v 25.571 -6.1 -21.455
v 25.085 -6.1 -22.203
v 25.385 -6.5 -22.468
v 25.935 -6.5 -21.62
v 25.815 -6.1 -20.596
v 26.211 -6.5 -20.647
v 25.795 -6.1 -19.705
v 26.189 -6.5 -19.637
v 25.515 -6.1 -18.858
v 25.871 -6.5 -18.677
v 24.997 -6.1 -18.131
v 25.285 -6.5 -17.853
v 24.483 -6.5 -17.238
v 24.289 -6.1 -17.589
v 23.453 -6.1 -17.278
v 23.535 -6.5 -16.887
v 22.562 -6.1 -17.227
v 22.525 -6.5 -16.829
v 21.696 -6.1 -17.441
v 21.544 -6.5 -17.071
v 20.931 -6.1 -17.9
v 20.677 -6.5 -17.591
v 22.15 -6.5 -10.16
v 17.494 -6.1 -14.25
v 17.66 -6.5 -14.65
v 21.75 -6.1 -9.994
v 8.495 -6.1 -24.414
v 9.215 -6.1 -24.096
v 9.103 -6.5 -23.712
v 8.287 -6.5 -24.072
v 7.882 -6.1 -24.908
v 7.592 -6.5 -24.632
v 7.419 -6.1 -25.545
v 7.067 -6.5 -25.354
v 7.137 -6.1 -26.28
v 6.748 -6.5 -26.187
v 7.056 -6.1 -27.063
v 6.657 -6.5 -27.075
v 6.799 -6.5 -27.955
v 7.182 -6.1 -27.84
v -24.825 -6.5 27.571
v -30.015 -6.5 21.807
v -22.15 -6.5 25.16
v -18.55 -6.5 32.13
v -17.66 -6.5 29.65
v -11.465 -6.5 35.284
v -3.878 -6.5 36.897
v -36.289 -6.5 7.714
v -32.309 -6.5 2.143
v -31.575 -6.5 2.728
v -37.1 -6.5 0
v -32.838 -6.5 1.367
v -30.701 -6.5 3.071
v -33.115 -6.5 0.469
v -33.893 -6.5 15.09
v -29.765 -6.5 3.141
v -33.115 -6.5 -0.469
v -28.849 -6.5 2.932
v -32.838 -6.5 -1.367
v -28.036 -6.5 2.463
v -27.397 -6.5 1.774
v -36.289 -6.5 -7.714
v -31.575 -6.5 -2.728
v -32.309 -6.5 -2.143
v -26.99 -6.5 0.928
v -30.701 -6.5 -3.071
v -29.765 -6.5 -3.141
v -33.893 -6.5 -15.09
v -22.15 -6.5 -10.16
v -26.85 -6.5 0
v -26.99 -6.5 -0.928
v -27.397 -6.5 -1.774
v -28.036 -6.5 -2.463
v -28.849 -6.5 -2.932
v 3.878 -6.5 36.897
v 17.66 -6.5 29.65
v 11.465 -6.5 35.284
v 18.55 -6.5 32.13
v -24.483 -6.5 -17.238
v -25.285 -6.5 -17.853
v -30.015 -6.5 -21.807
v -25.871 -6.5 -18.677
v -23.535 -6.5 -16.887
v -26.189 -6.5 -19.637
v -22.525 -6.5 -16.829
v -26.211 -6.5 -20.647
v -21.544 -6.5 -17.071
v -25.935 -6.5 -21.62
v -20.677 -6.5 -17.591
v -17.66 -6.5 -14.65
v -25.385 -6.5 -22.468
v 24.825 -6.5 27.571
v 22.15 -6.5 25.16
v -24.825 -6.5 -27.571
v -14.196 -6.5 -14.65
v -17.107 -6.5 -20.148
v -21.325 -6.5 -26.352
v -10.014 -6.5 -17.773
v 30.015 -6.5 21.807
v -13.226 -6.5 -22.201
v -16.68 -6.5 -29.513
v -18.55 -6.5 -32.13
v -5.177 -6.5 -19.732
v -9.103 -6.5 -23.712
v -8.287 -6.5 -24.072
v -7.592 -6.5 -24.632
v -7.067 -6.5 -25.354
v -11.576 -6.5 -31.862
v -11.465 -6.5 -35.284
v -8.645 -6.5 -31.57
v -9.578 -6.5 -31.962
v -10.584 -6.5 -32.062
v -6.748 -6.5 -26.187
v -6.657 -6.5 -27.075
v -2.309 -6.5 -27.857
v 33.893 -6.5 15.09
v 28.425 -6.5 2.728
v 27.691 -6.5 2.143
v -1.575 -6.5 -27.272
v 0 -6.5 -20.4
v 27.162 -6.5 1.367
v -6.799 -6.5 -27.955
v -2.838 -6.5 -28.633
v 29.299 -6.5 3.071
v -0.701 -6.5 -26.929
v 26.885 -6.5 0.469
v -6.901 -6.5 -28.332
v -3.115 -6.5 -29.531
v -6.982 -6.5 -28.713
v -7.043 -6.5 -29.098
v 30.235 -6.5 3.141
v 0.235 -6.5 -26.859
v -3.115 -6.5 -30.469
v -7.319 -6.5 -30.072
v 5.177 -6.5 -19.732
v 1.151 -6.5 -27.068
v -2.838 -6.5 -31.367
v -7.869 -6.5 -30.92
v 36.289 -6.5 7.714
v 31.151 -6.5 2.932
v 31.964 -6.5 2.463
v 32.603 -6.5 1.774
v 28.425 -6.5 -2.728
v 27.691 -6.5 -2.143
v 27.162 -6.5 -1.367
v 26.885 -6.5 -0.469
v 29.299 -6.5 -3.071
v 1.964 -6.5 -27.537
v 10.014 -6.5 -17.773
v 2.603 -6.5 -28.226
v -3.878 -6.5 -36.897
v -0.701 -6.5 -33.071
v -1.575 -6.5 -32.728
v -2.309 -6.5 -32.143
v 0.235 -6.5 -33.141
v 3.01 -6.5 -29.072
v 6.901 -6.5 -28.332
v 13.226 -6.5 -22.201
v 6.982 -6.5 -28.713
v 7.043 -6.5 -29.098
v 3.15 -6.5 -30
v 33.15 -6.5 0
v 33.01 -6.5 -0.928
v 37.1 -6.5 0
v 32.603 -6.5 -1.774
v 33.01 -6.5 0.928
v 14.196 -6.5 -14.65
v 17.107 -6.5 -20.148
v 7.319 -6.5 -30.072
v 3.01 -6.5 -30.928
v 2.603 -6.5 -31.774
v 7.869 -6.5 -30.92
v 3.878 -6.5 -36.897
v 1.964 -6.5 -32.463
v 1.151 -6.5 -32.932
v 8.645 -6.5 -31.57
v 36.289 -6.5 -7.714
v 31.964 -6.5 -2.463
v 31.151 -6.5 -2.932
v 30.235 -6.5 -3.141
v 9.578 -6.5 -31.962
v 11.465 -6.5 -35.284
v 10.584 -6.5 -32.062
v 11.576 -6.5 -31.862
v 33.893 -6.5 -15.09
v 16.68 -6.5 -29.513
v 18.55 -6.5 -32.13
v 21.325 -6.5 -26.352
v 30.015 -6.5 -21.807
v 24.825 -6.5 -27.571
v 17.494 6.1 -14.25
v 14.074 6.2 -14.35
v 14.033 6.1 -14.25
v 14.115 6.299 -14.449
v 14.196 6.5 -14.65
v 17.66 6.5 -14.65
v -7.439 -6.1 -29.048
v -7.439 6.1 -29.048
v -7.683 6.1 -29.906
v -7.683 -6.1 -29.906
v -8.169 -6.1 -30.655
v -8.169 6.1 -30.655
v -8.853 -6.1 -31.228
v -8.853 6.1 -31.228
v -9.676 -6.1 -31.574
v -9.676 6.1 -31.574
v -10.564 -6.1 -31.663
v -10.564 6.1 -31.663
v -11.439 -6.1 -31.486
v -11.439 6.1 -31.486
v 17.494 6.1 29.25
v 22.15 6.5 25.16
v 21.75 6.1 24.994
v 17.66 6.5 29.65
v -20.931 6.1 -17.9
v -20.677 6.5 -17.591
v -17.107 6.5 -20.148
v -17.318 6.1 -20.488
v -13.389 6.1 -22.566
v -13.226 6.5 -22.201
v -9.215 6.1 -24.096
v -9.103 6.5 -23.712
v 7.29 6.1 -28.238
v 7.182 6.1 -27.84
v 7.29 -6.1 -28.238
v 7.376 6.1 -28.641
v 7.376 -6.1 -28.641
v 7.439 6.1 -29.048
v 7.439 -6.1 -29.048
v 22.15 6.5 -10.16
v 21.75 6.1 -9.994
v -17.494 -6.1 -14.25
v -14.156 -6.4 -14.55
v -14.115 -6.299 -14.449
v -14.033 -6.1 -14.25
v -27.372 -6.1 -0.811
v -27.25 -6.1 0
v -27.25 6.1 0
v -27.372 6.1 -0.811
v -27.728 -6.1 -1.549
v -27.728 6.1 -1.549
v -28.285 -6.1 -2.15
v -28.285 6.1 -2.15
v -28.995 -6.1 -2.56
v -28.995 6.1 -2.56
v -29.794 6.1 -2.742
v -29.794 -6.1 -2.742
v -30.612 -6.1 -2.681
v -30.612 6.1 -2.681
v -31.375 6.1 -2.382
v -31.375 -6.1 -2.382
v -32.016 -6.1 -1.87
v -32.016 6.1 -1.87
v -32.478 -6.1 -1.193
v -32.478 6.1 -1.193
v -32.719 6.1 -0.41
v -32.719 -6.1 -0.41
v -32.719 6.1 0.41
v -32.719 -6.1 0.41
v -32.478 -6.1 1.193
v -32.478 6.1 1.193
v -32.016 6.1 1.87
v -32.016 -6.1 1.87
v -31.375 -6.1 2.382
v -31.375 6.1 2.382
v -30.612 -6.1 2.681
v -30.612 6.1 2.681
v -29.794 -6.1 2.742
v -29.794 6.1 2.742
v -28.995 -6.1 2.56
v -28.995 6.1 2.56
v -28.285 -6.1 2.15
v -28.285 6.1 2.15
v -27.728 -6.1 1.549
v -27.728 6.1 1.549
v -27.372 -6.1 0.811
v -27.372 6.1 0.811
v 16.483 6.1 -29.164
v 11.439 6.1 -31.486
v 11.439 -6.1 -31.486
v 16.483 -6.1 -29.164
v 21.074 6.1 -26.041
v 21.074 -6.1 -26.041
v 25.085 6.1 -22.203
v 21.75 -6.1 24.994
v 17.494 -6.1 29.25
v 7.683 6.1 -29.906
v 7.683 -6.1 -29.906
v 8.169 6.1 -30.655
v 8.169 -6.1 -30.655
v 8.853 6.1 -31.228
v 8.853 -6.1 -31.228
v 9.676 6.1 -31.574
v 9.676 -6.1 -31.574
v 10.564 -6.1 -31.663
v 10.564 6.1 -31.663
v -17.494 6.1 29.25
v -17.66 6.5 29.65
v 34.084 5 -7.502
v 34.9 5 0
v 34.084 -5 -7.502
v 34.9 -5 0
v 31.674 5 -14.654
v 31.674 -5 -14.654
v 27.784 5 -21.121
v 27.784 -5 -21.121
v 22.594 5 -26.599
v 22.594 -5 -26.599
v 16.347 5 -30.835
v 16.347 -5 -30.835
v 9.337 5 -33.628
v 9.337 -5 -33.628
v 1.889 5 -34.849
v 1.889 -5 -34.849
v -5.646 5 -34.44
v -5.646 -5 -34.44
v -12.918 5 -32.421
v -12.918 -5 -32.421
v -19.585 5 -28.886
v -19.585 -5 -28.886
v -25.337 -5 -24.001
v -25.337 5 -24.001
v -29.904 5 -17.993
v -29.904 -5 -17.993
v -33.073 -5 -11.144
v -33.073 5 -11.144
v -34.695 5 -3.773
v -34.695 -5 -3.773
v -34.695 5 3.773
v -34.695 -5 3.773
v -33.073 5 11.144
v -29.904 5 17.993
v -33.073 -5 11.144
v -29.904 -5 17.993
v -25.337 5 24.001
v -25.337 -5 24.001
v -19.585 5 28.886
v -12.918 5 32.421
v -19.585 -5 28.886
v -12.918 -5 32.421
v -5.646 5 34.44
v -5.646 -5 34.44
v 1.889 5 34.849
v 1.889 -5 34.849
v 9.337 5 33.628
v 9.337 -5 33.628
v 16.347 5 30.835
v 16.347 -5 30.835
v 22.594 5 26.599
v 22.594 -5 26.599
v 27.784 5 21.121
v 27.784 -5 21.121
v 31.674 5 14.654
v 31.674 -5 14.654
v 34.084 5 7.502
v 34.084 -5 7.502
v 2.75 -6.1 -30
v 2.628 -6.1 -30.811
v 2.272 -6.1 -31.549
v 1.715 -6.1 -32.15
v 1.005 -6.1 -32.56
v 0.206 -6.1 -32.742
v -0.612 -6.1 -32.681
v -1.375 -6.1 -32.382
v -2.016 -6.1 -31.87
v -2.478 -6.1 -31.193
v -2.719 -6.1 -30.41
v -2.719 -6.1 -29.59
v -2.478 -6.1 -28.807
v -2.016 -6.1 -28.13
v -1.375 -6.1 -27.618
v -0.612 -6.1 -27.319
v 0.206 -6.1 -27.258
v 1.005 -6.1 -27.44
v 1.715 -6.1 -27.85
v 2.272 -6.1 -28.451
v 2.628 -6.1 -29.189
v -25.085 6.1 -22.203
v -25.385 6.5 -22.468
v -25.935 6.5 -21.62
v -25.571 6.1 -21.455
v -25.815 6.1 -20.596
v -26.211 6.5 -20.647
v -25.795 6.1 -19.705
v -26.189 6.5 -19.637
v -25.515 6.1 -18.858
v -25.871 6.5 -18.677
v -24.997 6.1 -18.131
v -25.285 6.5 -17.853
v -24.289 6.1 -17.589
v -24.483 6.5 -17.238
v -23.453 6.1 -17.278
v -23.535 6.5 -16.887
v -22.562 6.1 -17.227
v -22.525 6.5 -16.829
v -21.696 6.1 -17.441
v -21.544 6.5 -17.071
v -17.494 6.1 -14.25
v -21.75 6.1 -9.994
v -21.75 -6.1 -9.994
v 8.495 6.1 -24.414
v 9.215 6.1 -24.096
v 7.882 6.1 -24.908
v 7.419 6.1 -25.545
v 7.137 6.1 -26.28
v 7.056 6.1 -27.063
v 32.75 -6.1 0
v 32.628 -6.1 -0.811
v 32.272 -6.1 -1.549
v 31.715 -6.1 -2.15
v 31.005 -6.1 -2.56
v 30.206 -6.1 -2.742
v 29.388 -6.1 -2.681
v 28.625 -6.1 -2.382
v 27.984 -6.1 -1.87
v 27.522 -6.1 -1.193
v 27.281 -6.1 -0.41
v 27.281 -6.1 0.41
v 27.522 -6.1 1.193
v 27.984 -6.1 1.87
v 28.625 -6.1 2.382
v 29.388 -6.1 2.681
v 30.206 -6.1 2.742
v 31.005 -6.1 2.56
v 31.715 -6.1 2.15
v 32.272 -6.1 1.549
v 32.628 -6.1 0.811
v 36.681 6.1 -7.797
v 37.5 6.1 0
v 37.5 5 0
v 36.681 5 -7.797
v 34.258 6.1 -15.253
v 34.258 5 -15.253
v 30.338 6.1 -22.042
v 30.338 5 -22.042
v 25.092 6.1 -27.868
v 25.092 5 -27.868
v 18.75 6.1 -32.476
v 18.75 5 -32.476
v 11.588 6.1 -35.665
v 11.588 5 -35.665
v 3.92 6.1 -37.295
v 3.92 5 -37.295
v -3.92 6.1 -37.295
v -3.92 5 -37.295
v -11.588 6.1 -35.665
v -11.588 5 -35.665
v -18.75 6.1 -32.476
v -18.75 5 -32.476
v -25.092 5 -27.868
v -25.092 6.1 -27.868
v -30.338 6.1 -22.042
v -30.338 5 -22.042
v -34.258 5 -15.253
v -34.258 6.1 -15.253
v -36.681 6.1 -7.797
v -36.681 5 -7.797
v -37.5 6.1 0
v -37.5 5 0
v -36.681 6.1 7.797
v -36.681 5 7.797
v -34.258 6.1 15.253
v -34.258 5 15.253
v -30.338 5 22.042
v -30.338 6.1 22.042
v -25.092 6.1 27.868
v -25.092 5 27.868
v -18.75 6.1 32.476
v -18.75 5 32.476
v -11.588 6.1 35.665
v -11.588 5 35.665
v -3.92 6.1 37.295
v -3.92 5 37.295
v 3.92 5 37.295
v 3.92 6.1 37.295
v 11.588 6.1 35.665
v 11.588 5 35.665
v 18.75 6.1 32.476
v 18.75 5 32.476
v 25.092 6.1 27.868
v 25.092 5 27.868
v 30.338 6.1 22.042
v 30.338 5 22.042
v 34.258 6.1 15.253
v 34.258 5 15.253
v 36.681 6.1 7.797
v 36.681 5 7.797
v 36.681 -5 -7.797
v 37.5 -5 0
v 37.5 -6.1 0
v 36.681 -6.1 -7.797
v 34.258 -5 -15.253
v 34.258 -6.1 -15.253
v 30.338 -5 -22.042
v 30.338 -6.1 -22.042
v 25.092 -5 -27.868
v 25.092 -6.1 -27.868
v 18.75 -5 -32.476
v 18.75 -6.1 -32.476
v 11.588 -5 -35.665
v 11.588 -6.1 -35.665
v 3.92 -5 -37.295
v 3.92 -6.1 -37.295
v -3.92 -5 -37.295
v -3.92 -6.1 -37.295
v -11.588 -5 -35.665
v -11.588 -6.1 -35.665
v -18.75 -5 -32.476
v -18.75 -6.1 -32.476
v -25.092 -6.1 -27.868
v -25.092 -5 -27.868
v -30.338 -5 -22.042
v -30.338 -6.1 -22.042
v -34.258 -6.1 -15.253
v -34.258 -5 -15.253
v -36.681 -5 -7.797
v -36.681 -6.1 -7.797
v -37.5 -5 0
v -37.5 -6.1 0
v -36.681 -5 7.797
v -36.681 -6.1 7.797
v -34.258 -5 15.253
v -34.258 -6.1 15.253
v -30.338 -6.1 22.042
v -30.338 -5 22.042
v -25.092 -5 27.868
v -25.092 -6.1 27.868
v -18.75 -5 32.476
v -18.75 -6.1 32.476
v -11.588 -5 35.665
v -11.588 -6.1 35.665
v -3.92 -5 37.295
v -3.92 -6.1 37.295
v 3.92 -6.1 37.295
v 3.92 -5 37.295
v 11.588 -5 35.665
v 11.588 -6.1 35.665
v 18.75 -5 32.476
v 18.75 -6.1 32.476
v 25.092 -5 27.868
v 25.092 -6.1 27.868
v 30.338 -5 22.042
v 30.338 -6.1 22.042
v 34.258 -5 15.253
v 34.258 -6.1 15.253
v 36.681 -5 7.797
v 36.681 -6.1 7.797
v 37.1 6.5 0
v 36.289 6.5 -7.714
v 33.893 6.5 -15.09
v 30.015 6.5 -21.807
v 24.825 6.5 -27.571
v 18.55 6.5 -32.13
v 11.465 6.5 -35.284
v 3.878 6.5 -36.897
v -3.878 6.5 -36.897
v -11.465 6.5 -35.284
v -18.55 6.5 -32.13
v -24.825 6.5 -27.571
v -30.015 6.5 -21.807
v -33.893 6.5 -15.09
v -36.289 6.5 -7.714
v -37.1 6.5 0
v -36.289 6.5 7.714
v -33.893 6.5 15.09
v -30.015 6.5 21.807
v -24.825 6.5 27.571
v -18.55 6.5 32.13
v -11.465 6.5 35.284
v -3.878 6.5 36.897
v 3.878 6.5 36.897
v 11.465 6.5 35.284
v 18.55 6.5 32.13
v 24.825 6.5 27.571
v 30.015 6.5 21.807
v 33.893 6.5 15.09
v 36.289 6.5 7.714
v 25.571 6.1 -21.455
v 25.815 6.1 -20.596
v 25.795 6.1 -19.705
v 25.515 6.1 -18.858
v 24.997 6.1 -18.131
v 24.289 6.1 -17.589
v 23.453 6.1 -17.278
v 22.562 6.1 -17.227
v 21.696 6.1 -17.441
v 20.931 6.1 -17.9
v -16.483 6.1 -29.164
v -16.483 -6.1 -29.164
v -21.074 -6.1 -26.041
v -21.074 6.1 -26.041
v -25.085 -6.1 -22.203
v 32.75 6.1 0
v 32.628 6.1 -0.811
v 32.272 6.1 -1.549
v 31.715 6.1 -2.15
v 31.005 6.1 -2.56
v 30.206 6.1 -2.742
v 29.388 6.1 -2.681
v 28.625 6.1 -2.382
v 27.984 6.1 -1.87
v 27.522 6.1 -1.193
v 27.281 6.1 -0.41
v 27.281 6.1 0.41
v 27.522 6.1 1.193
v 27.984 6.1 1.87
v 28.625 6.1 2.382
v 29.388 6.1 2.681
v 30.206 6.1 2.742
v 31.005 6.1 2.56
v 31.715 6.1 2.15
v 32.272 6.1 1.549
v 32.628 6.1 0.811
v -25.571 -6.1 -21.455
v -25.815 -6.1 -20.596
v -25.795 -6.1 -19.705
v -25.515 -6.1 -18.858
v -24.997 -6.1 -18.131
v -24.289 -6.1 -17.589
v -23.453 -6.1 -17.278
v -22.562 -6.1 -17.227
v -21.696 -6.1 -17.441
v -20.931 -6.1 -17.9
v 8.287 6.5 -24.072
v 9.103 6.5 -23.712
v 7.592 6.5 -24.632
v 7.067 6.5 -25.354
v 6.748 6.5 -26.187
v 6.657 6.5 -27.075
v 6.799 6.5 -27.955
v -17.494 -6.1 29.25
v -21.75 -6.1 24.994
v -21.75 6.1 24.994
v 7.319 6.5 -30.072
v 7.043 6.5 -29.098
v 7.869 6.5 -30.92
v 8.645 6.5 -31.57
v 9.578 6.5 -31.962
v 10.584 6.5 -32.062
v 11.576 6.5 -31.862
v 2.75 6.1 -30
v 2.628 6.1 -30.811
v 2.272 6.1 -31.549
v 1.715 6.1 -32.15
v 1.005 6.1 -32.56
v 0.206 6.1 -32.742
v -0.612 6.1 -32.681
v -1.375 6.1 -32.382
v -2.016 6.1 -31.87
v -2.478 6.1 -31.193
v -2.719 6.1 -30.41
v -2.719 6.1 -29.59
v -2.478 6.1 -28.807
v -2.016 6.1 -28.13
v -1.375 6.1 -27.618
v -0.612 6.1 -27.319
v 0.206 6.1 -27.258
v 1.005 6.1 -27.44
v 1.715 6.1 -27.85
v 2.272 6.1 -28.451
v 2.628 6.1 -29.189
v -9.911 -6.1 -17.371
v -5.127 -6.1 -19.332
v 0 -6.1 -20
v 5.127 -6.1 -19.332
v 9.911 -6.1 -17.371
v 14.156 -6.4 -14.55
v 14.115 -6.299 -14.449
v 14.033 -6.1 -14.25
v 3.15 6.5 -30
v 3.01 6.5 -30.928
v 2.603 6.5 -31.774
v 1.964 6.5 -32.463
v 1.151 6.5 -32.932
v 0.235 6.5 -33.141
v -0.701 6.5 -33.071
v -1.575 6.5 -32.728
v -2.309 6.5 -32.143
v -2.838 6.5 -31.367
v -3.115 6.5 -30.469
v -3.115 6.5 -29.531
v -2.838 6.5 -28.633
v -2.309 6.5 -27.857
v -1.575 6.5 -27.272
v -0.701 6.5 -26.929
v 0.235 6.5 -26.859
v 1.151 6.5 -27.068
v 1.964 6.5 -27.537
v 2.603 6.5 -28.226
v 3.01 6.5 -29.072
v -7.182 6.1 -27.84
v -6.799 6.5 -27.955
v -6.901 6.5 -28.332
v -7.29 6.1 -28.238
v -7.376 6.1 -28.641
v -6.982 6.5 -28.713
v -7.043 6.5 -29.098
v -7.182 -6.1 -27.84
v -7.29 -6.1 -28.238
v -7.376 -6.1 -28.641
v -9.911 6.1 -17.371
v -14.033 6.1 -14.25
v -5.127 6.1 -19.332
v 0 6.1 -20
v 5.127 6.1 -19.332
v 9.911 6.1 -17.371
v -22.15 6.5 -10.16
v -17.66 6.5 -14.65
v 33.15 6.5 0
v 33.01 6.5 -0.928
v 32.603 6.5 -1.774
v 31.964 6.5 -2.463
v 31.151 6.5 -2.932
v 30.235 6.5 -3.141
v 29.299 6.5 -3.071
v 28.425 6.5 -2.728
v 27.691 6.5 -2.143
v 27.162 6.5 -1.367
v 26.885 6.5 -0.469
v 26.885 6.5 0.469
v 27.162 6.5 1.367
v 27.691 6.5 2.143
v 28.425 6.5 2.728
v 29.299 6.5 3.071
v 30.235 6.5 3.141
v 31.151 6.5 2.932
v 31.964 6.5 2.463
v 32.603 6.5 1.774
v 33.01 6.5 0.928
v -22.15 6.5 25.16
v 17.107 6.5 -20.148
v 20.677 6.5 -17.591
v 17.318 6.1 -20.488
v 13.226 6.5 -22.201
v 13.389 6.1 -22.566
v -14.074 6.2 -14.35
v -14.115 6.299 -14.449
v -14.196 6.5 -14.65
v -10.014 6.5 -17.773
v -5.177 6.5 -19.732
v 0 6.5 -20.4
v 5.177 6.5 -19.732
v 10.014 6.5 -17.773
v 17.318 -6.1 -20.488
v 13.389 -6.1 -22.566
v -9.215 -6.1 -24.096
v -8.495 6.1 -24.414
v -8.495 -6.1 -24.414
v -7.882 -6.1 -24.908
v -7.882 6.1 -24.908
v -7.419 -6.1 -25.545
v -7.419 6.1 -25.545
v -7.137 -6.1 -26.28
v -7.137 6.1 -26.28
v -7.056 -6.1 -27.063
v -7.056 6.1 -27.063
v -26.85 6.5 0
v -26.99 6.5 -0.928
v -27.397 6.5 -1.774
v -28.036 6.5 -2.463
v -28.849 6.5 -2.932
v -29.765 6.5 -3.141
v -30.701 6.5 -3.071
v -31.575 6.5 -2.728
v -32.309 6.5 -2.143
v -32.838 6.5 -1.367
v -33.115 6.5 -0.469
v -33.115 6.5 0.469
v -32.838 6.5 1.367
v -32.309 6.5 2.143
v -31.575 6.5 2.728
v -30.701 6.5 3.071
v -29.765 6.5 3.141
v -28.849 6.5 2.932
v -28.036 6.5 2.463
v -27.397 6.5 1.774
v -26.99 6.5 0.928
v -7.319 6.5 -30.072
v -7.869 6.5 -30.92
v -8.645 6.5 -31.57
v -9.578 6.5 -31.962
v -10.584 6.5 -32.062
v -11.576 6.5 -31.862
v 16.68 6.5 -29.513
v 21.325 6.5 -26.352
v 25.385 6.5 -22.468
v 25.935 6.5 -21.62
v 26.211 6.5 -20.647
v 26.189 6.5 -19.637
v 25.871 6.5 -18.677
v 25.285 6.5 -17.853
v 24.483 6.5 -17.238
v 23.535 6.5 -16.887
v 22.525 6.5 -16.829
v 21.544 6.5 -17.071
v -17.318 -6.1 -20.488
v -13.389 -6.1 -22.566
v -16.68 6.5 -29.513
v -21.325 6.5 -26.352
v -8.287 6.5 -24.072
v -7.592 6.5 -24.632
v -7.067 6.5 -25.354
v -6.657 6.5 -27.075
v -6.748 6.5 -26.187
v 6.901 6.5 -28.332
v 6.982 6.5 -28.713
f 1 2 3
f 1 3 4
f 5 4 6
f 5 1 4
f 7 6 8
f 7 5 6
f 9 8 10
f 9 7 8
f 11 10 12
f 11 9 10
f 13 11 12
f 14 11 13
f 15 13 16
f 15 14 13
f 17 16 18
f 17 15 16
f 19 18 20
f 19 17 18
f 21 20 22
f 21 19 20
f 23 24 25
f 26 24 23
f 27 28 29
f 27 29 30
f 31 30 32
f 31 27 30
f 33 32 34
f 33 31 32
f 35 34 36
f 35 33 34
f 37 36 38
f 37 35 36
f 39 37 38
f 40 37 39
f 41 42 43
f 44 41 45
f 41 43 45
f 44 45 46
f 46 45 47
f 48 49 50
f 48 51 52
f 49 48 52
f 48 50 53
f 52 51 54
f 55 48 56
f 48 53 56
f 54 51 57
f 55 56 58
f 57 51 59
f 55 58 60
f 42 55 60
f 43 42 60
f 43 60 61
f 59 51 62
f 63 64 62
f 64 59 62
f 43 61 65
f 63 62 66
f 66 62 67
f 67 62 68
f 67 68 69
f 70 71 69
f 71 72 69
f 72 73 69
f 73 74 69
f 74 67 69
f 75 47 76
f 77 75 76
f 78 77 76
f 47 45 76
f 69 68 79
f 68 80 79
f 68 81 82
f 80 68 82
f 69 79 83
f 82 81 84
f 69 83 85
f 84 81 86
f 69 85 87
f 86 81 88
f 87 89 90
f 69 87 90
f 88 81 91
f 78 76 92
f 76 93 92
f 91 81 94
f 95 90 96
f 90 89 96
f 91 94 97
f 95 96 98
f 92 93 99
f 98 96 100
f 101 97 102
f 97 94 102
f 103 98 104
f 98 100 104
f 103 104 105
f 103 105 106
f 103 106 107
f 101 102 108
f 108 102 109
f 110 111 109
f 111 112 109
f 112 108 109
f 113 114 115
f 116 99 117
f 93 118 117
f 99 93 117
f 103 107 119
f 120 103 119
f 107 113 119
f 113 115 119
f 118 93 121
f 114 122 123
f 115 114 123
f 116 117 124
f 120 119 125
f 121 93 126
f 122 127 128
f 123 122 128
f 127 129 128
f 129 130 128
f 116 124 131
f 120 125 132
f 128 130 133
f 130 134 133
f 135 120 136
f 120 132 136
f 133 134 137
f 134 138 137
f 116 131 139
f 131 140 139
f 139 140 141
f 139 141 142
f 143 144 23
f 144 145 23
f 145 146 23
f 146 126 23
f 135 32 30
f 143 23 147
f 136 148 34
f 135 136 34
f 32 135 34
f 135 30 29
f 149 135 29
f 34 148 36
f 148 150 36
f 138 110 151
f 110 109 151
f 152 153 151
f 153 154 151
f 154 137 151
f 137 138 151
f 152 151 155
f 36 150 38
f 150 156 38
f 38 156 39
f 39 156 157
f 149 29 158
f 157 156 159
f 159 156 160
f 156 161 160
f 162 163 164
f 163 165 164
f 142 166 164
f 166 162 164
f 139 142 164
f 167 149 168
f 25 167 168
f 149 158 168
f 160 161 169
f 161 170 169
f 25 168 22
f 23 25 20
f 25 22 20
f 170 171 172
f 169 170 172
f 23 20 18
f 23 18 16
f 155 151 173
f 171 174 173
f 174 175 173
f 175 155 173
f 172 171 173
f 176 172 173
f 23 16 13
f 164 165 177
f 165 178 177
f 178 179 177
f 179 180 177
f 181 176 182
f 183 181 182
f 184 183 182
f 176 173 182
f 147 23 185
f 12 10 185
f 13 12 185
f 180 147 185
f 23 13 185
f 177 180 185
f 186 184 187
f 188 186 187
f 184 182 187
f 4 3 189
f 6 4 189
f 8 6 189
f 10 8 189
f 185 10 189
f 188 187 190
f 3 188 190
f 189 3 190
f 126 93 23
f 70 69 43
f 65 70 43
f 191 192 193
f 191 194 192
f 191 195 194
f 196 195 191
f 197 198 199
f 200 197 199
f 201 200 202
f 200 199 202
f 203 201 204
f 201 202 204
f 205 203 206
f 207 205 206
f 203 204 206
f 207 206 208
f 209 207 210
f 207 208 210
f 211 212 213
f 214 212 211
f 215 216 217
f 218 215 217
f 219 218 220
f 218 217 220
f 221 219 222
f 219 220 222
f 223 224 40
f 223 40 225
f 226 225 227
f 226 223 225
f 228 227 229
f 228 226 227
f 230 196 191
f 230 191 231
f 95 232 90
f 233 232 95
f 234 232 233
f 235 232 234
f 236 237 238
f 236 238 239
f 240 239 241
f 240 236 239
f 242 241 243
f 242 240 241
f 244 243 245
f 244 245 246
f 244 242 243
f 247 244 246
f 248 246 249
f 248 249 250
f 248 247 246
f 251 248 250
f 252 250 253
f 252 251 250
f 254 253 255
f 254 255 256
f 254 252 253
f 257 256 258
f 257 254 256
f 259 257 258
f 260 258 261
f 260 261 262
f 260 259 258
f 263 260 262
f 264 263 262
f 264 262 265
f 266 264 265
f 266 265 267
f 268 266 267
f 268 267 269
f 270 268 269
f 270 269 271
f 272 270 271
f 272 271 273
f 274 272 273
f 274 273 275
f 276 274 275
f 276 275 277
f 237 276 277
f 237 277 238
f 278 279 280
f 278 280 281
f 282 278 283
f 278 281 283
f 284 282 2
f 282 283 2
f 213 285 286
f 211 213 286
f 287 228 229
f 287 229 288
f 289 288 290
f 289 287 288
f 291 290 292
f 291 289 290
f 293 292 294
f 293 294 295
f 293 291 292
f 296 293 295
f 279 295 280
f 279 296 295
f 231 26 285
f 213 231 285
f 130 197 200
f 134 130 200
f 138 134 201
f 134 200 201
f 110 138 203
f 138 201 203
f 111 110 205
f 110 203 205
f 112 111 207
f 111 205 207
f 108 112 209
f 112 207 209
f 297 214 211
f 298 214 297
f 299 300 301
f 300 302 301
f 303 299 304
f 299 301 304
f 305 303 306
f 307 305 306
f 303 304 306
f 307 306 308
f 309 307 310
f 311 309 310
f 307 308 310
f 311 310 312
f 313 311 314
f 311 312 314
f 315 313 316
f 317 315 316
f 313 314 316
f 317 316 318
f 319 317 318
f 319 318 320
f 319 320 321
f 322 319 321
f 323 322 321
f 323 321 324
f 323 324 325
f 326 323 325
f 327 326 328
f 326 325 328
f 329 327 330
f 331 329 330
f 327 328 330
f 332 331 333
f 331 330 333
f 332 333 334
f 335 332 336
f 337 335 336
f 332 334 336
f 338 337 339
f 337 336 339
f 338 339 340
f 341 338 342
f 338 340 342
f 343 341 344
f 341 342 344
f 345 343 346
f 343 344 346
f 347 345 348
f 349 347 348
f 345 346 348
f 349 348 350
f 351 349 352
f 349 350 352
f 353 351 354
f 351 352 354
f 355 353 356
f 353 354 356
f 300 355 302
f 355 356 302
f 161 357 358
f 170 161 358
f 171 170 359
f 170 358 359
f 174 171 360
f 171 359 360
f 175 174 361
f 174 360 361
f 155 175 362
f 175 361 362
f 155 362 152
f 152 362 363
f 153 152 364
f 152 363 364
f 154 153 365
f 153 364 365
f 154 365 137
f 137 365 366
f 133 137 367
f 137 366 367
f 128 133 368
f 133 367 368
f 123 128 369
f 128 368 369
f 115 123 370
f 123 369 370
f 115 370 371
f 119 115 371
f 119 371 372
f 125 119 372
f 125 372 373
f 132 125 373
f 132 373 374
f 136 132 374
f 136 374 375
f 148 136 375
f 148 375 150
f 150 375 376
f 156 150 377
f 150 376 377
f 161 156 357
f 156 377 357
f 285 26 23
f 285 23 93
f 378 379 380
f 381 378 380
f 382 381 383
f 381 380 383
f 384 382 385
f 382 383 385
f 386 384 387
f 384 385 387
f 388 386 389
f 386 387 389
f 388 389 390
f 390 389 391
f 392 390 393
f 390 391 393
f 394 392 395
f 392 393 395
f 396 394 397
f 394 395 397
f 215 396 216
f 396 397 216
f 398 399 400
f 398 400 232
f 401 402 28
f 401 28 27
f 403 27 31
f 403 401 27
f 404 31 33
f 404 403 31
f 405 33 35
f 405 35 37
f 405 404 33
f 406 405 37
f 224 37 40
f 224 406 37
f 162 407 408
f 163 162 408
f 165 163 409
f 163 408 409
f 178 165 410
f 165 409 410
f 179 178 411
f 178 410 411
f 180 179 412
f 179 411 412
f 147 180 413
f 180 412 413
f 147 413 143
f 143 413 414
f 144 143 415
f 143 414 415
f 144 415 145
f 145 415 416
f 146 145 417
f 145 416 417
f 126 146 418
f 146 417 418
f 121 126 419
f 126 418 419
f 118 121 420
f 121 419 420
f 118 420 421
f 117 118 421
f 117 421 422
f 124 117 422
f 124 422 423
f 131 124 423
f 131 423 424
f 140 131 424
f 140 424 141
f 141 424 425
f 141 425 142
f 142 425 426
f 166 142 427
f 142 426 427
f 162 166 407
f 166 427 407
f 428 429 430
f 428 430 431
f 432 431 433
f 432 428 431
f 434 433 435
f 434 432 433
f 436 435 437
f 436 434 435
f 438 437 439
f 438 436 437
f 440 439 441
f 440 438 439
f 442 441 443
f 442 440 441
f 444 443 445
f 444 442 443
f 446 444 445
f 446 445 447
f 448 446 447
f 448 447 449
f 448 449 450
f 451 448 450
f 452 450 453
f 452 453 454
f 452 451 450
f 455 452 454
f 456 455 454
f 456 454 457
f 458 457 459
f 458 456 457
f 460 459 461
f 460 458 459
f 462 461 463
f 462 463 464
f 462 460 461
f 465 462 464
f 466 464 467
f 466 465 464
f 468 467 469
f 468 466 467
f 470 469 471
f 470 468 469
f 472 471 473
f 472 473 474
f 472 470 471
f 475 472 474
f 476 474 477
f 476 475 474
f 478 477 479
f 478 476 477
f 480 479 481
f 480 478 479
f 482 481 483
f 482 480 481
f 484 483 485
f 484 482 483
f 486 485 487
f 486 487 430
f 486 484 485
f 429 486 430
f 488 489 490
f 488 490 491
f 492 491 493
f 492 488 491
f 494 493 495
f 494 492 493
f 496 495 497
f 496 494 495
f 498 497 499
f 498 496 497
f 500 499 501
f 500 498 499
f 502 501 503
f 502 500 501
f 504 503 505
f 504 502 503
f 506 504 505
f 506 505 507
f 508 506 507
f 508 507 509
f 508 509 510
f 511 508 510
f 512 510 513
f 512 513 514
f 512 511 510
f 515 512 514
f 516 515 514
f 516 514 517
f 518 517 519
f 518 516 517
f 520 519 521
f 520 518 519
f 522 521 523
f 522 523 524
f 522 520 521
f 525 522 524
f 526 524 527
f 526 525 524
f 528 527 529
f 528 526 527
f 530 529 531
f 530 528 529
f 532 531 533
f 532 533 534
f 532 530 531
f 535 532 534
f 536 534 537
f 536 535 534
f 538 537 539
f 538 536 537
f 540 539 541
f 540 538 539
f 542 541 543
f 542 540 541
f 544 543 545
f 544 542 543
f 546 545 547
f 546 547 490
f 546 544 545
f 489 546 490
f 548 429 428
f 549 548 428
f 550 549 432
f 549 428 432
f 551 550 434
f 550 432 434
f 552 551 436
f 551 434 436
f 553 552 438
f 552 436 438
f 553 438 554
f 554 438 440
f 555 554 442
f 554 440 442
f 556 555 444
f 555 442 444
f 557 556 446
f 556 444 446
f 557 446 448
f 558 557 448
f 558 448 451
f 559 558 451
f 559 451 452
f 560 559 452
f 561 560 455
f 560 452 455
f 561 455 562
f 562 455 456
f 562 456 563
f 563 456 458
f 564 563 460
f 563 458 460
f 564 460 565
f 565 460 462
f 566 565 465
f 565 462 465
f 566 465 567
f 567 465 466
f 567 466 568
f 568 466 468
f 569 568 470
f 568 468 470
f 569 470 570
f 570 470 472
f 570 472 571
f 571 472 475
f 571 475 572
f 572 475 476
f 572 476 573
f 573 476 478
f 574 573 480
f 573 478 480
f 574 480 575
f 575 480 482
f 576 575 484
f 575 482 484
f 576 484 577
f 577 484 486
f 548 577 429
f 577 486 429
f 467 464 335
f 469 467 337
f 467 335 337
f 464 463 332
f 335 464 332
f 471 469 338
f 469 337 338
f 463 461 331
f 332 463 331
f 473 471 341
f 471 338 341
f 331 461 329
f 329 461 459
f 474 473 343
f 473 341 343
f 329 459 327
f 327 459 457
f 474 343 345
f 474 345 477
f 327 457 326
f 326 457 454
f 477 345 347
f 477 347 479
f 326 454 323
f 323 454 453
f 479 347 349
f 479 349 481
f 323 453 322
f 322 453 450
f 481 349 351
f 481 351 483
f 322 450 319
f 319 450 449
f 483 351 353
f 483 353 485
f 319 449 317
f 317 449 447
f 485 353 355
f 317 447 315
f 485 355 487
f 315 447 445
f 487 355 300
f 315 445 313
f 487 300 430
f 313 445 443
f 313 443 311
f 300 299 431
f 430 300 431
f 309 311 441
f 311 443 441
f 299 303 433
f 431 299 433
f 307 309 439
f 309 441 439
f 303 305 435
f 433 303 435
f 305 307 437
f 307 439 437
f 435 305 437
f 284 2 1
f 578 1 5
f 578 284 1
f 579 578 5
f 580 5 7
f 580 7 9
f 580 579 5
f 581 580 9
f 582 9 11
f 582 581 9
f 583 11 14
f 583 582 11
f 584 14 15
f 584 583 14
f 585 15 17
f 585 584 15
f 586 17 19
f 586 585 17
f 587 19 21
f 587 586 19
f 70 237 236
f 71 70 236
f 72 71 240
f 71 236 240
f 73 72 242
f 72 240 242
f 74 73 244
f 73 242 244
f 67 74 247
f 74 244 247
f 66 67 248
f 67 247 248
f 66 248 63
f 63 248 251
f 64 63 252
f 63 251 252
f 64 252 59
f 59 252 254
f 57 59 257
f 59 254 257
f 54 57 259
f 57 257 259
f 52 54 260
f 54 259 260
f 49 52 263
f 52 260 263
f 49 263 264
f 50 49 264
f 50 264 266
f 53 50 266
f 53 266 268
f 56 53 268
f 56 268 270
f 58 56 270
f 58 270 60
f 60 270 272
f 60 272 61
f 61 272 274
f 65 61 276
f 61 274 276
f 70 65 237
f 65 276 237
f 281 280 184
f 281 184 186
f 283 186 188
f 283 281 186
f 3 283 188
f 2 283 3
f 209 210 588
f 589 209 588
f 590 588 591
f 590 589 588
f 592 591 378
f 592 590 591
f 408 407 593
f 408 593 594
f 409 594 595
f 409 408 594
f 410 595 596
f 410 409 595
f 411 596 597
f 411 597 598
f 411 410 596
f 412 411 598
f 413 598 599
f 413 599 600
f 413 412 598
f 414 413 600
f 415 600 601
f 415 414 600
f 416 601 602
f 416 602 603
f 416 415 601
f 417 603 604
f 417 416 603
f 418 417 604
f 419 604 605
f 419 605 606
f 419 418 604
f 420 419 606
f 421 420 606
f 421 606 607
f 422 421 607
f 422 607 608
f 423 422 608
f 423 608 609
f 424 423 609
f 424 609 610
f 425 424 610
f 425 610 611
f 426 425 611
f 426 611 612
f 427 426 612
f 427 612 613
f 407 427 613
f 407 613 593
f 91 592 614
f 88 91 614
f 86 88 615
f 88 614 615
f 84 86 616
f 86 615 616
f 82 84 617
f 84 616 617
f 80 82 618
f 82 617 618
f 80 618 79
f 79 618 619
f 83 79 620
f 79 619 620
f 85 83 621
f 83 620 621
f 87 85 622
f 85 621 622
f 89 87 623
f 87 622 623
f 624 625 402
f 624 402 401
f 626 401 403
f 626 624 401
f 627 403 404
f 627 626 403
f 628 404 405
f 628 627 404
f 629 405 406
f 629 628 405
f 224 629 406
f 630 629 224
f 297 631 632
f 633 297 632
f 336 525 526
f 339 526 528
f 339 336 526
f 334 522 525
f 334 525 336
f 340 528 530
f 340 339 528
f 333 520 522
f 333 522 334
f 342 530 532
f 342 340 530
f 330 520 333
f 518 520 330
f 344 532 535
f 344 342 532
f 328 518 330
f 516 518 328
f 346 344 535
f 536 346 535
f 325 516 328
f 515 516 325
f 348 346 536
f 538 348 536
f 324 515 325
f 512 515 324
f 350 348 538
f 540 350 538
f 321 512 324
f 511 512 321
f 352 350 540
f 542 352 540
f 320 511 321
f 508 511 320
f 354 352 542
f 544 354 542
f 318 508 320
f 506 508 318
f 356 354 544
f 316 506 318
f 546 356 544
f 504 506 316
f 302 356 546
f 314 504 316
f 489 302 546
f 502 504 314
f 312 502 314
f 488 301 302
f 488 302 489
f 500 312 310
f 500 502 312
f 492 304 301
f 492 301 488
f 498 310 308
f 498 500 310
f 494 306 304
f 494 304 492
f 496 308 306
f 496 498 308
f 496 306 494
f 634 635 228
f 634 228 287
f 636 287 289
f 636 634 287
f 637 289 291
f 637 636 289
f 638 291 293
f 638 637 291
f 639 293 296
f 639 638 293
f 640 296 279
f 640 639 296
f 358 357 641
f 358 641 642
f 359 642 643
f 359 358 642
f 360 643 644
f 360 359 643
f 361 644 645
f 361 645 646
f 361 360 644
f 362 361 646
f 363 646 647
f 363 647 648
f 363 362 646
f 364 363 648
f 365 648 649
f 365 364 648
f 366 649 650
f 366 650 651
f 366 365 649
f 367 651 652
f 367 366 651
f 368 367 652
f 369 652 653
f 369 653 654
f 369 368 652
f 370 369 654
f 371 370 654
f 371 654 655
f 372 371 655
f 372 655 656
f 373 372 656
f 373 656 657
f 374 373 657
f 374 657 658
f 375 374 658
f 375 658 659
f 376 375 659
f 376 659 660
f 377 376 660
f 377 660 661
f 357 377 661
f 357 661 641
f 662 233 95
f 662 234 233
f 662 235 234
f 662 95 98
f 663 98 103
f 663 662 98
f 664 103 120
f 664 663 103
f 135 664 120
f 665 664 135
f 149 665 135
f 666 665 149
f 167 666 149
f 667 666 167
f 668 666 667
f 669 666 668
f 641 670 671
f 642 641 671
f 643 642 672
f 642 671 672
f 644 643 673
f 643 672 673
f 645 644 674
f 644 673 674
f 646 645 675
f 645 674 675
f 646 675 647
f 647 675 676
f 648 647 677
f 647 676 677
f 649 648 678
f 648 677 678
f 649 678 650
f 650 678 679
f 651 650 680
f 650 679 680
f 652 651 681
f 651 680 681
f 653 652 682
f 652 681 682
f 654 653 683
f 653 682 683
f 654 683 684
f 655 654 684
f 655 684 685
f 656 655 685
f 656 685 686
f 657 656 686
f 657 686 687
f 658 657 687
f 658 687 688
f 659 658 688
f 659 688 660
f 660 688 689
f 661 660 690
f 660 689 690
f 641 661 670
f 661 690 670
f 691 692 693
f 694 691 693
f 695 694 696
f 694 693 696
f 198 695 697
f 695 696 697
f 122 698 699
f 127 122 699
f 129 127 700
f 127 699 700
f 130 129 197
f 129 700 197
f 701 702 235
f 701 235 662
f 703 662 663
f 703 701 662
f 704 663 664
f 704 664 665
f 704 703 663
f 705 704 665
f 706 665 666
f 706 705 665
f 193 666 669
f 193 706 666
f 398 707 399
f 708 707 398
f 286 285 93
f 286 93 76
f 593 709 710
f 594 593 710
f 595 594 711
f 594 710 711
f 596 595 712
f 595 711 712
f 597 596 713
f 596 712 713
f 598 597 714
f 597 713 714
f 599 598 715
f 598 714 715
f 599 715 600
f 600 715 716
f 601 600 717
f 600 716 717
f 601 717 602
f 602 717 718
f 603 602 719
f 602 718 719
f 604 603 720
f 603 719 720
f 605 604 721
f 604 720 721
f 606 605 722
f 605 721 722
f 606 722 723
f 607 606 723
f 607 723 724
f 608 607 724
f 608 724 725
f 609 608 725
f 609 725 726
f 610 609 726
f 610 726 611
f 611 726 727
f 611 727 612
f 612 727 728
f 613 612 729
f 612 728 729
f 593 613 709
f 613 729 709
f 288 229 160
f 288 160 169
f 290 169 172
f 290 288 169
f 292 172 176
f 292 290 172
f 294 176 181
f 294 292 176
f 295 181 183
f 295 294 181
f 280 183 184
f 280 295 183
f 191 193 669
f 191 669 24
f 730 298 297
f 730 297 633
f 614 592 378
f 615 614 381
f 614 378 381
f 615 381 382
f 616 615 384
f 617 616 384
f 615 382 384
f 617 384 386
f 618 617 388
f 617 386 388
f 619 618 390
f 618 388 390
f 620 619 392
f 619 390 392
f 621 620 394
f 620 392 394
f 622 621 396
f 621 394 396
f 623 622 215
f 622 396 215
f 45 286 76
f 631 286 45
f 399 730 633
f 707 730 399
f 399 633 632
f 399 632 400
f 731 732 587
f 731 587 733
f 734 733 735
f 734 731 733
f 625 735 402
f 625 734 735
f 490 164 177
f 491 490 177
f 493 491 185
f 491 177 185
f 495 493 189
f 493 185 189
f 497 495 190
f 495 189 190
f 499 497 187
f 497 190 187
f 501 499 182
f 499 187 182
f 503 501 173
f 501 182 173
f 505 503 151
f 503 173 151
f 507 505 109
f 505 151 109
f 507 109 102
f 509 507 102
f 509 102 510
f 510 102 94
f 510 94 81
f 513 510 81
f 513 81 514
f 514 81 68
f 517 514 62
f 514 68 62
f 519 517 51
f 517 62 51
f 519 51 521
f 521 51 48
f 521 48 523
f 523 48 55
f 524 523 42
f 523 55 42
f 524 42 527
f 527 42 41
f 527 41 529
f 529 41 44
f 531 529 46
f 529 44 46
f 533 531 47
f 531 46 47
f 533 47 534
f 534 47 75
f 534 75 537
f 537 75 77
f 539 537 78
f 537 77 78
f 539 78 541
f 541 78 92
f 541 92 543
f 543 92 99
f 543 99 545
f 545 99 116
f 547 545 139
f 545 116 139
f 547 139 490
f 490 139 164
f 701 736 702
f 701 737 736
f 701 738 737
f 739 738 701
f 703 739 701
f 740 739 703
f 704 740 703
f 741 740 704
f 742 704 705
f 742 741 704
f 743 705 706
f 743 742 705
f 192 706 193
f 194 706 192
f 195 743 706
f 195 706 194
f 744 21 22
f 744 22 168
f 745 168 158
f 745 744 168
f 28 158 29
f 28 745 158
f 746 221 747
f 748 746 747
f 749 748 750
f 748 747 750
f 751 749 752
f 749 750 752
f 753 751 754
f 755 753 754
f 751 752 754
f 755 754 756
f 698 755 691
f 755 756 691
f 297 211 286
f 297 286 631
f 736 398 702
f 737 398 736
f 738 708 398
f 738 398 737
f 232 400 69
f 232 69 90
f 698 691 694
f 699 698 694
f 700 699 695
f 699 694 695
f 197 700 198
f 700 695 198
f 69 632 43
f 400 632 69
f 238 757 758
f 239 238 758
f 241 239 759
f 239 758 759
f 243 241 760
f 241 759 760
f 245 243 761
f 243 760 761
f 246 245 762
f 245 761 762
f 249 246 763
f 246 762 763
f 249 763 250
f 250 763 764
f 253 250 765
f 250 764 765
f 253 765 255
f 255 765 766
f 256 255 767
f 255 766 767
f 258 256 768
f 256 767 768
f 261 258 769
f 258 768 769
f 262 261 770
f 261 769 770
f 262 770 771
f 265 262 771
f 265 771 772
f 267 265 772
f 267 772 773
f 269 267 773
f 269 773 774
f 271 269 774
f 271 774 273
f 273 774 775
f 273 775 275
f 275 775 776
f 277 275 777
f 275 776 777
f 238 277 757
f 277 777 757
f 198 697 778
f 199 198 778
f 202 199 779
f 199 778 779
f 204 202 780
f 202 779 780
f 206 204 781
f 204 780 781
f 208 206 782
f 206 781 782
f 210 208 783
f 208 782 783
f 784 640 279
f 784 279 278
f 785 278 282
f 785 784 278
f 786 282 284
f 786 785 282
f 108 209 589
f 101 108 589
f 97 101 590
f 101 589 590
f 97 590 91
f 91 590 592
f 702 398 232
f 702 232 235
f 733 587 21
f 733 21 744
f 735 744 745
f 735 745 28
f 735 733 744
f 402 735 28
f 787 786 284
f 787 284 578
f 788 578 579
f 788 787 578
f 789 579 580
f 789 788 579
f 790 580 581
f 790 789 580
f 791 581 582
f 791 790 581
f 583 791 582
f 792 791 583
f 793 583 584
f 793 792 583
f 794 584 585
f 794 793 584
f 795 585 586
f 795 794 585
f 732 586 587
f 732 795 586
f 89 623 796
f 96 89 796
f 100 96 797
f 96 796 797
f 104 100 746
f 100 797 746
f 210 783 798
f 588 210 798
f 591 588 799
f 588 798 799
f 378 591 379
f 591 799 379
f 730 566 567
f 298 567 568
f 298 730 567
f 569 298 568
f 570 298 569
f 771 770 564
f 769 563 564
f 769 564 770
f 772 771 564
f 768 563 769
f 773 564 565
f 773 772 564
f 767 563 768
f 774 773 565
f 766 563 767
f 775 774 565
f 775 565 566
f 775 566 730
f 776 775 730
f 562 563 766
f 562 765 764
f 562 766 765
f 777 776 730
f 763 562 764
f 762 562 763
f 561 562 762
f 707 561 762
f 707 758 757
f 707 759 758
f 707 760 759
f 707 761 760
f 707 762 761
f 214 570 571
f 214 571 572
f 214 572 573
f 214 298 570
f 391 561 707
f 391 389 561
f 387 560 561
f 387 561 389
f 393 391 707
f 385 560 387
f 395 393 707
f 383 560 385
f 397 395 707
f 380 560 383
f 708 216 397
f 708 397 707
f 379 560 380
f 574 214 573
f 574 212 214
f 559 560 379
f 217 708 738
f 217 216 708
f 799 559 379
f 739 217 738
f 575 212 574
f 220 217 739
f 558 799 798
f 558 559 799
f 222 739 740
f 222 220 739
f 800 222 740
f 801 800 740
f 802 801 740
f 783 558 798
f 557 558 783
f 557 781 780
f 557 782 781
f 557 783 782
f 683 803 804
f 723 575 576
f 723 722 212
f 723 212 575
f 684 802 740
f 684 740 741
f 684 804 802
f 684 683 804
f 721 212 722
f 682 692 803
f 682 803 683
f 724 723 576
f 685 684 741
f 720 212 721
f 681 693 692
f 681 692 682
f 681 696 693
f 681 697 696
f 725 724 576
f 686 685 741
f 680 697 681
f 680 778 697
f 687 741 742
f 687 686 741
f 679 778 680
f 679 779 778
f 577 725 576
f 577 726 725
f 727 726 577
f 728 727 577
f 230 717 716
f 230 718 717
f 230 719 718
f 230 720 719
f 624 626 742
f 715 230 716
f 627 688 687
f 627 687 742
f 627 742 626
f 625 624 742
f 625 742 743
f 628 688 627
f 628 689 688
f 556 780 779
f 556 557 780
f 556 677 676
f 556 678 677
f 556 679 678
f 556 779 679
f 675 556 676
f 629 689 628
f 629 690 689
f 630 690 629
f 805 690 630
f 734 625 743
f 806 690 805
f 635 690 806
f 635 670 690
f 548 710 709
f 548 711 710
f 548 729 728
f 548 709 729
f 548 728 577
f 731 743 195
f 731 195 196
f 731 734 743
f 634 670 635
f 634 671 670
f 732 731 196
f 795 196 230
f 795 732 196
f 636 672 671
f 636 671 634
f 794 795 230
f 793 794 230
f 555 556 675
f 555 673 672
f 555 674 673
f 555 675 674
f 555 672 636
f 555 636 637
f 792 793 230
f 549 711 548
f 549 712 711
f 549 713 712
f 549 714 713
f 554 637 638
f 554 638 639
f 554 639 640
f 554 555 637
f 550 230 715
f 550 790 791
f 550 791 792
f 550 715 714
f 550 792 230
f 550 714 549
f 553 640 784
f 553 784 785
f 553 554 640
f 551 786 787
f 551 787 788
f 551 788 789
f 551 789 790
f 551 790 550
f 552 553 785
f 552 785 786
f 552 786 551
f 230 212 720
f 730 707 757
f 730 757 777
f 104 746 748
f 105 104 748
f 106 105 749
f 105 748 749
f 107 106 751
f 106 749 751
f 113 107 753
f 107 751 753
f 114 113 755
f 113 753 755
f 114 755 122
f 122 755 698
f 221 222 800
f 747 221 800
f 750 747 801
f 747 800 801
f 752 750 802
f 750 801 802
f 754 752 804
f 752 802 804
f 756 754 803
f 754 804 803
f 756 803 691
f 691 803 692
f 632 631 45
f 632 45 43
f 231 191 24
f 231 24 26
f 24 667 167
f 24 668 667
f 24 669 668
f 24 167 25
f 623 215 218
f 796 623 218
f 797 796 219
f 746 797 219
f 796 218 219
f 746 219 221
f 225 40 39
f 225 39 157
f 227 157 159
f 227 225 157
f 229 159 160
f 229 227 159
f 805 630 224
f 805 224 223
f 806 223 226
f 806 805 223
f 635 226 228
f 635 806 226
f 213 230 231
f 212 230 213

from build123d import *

# Parameters (mm, degrees)
SKETCH1_R               = 37.5
SKETCH1_R_2             = 2.75
BOSS_EXTRUDE1_DEPTH     = 6.5
SKETCH2_R               = 44.9
SKETCH2_R_2             = 34.9
CUT_EXTRUDE_THIN1_DEPTH = 5
CHAMFER1_SIZE           = 0.4
CHAMFER2_SIZE           = 0.4


with BuildPart() as part:
    # Sketch1 → Boss-Extrude1 (new body, symmetric)
    with BuildSketch(Plane(origin=(0, 0, 0), x_dir=(1, 0, 0), z_dir=(0, 1, 0))):
        Circle(SKETCH1_R)
        with Locations((0, 30)):
            Circle(SKETCH1_R_2, mode=Mode.SUBTRACT)
        with Locations((30, 0)):
            Circle(SKETCH1_R_2, mode=Mode.SUBTRACT)
        with Locations((-30, 0)):
            Circle(SKETCH1_R_2, mode=Mode.SUBTRACT)
        with BuildLine():
            Line((-17.494426356, 14.25), (-14.033442201, 14.25))
            ThreePointArc((-14.033442201, 14.25), (0, 20), (14.033442201, 14.25))
            Line((14.033442201, 14.25), (17.494426356, 14.25))
            Line((17.494426356, 14.25), (21.75, 9.994426356))
            Line((21.75, 9.994426356), (21.75, -24.994426356))
            Line((21.75, -24.994426356), (17.494426356, -29.25))
            Line((17.494426356, -29.25), (-17.494426356, -29.25))
            Line((-17.494426356, -29.25), (-21.75, -24.994426356))
            Line((-21.75, -24.994426356), (-21.75, 9.994426356))
            Line((-21.75, 9.994426356), (-17.494426356, 14.25))
        make_face(mode=Mode.SUBTRACT)
        with BuildLine():
            ThreePointArc((7.182286097, 27.840192967), (7.335670337, 28.438609369), (7.439285619, 29.047619048))
            ThreePointArc((7.439285619, 29.047619048), (8.853359783, 31.228166276), (11.439426083, 31.486338798))
            ThreePointArc((11.439426083, 31.486338798), (18.843045333, 27.698188435), (25.085377879, 22.203013684))
            ThreePointArc((25.085377879, 22.203013684), (24.997326571, 18.131103641), (20.931054397, 17.899511222))
            ThreePointArc((20.931054397, 17.899511222), (15.388292289, 21.593722157), (9.215229657, 24.09626166))
            ThreePointArc((9.215229657, 24.09626166), (7.418794885, 25.54470973), (7.182286097, 27.840192967))
        make_face(mode=Mode.SUBTRACT)
        with BuildLine():
            ThreePointArc((-25.085377879, 22.203013684), (-24.997326571, 18.131103641), (-20.931054397, 17.899511222))
            ThreePointArc((-20.931054397, 17.899511222), (-15.388292289, 21.593722157), (-9.215229657, 24.09626166))
            ThreePointArc((-9.215229657, 24.09626166), (-7.418794885, 25.54470973), (-7.182286097, 27.840192967))
            ThreePointArc((-7.182286097, 27.840192967), (-7.335670337, 28.438609369), (-7.439285619, 29.047619048))
            ThreePointArc((-7.439285619, 29.047619048), (-8.853359783, 31.228166276), (-11.439426083, 31.486338798))
            ThreePointArc((-11.439426083, 31.486338798), (-18.843045333, 27.698188435), (-25.085377879, 22.203013684))
        make_face(mode=Mode.SUBTRACT)
    extrude(amount=BOSS_EXTRUDE1_DEPTH, both=True)

    # Sketch2 → Cut-Extrude-Thin1 (cut, symmetric)
    with BuildSketch(Plane(origin=(0, 0, 0), x_dir=(1, 0, 0), z_dir=(0, 1, 0))):
        Circle(SKETCH2_R)
        Circle(SKETCH2_R_2, mode=Mode.SUBTRACT)
    extrude(amount=CUT_EXTRUDE_THIN1_DEPTH, both=True, mode=Mode.SUBTRACT)

    # Chamfer1
    chamfer1_edges = [part.edges().sort_by_distance(p)[0] for p in [
        (-37.5, -6.5, 0),
        (-37.5, 6.5, 0),
    ]]
    chamfer(chamfer1_edges, length=CHAMFER1_SIZE)

    # Chamfer2
    chamfer2_edges = [part.edges().sort_by_distance(p)[0] for p in [
        (-19.622213178, -6.5, -12.122213178),
        (-21.75, -6.5, 7.5),
        (-19.622213178, -6.5, 27.122213178),
        (0, -6.5, 29.25),
        (19.622213178, -6.5, 27.122213178),
        (21.75, -6.5, 7.5),
        (19.622213178, -6.5, -12.122213178),
        (15.763934278, -6.5, -14.25),
        (0, -6.5, -20),
        (-15.763934278, -6.5, -14.25),
        (-19.622213178, 6.5, -12.122213178),
        (-21.75, 6.5, 7.5),
        (-19.622213178, 6.5, 27.122213178),
        (0, 6.5, 29.25),
        (19.622213178, 6.5, 27.122213178),
        (21.75, 6.5, 7.5),
        (19.622213178, 6.5, -12.122213178),
        (15.763934278, 6.5, -14.25),
        (0, 6.5, -20),
        (-15.763934278, 6.5, -14.25),
        (-2.75, -6.5, -30),
        (-2.75, 6.5, -30),
        (27.25, -6.5, 0),
        (27.25, 6.5, 0),
        (-32.75, -6.5, 0),
        (-32.75, 6.5, 0),
        (-15.388292289, -6.5, -21.593722157),
        (-7.418794885, -6.5, -25.54470973),
        (-7.335670337, -6.5, -28.438609369),
        (-8.853359783, -6.5, -31.228166276),
        (-18.843045333, -6.5, -27.698188435),
        (-24.997326571, -6.5, -18.131103641),
        (-15.388292289, 6.5, -21.593722157),
        (-7.418794885, 6.5, -25.54470973),
        (-7.335670337, 6.5, -28.438609369),
        (-8.853359783, 6.5, -31.228166276),
        (-18.843045333, 6.5, -27.698188435),
        (-24.997326571, 6.5, -18.131103641),
        (18.843045333, -6.5, -27.698188435),
        (8.853359783, -6.5, -31.228166276),
        (7.335670337, -6.5, -28.438609369),
        (7.418794885, -6.5, -25.54470973),
        (15.388292289, -6.5, -21.593722157),
        (24.997326571, -6.5, -18.131103641),
        (18.843045333, 6.5, -27.698188435),
        (8.853359783, 6.5, -31.228166276),
        (7.335670337, 6.5, -28.438609369),
        (7.418794885, 6.5, -25.54470973),
        (15.388292289, 6.5, -21.593722157),
        (24.997326571, 6.5, -18.131103641),
    ]]
    chamfer(chamfer2_edges, length=CHAMFER2_SIZE)


solid = part.part
